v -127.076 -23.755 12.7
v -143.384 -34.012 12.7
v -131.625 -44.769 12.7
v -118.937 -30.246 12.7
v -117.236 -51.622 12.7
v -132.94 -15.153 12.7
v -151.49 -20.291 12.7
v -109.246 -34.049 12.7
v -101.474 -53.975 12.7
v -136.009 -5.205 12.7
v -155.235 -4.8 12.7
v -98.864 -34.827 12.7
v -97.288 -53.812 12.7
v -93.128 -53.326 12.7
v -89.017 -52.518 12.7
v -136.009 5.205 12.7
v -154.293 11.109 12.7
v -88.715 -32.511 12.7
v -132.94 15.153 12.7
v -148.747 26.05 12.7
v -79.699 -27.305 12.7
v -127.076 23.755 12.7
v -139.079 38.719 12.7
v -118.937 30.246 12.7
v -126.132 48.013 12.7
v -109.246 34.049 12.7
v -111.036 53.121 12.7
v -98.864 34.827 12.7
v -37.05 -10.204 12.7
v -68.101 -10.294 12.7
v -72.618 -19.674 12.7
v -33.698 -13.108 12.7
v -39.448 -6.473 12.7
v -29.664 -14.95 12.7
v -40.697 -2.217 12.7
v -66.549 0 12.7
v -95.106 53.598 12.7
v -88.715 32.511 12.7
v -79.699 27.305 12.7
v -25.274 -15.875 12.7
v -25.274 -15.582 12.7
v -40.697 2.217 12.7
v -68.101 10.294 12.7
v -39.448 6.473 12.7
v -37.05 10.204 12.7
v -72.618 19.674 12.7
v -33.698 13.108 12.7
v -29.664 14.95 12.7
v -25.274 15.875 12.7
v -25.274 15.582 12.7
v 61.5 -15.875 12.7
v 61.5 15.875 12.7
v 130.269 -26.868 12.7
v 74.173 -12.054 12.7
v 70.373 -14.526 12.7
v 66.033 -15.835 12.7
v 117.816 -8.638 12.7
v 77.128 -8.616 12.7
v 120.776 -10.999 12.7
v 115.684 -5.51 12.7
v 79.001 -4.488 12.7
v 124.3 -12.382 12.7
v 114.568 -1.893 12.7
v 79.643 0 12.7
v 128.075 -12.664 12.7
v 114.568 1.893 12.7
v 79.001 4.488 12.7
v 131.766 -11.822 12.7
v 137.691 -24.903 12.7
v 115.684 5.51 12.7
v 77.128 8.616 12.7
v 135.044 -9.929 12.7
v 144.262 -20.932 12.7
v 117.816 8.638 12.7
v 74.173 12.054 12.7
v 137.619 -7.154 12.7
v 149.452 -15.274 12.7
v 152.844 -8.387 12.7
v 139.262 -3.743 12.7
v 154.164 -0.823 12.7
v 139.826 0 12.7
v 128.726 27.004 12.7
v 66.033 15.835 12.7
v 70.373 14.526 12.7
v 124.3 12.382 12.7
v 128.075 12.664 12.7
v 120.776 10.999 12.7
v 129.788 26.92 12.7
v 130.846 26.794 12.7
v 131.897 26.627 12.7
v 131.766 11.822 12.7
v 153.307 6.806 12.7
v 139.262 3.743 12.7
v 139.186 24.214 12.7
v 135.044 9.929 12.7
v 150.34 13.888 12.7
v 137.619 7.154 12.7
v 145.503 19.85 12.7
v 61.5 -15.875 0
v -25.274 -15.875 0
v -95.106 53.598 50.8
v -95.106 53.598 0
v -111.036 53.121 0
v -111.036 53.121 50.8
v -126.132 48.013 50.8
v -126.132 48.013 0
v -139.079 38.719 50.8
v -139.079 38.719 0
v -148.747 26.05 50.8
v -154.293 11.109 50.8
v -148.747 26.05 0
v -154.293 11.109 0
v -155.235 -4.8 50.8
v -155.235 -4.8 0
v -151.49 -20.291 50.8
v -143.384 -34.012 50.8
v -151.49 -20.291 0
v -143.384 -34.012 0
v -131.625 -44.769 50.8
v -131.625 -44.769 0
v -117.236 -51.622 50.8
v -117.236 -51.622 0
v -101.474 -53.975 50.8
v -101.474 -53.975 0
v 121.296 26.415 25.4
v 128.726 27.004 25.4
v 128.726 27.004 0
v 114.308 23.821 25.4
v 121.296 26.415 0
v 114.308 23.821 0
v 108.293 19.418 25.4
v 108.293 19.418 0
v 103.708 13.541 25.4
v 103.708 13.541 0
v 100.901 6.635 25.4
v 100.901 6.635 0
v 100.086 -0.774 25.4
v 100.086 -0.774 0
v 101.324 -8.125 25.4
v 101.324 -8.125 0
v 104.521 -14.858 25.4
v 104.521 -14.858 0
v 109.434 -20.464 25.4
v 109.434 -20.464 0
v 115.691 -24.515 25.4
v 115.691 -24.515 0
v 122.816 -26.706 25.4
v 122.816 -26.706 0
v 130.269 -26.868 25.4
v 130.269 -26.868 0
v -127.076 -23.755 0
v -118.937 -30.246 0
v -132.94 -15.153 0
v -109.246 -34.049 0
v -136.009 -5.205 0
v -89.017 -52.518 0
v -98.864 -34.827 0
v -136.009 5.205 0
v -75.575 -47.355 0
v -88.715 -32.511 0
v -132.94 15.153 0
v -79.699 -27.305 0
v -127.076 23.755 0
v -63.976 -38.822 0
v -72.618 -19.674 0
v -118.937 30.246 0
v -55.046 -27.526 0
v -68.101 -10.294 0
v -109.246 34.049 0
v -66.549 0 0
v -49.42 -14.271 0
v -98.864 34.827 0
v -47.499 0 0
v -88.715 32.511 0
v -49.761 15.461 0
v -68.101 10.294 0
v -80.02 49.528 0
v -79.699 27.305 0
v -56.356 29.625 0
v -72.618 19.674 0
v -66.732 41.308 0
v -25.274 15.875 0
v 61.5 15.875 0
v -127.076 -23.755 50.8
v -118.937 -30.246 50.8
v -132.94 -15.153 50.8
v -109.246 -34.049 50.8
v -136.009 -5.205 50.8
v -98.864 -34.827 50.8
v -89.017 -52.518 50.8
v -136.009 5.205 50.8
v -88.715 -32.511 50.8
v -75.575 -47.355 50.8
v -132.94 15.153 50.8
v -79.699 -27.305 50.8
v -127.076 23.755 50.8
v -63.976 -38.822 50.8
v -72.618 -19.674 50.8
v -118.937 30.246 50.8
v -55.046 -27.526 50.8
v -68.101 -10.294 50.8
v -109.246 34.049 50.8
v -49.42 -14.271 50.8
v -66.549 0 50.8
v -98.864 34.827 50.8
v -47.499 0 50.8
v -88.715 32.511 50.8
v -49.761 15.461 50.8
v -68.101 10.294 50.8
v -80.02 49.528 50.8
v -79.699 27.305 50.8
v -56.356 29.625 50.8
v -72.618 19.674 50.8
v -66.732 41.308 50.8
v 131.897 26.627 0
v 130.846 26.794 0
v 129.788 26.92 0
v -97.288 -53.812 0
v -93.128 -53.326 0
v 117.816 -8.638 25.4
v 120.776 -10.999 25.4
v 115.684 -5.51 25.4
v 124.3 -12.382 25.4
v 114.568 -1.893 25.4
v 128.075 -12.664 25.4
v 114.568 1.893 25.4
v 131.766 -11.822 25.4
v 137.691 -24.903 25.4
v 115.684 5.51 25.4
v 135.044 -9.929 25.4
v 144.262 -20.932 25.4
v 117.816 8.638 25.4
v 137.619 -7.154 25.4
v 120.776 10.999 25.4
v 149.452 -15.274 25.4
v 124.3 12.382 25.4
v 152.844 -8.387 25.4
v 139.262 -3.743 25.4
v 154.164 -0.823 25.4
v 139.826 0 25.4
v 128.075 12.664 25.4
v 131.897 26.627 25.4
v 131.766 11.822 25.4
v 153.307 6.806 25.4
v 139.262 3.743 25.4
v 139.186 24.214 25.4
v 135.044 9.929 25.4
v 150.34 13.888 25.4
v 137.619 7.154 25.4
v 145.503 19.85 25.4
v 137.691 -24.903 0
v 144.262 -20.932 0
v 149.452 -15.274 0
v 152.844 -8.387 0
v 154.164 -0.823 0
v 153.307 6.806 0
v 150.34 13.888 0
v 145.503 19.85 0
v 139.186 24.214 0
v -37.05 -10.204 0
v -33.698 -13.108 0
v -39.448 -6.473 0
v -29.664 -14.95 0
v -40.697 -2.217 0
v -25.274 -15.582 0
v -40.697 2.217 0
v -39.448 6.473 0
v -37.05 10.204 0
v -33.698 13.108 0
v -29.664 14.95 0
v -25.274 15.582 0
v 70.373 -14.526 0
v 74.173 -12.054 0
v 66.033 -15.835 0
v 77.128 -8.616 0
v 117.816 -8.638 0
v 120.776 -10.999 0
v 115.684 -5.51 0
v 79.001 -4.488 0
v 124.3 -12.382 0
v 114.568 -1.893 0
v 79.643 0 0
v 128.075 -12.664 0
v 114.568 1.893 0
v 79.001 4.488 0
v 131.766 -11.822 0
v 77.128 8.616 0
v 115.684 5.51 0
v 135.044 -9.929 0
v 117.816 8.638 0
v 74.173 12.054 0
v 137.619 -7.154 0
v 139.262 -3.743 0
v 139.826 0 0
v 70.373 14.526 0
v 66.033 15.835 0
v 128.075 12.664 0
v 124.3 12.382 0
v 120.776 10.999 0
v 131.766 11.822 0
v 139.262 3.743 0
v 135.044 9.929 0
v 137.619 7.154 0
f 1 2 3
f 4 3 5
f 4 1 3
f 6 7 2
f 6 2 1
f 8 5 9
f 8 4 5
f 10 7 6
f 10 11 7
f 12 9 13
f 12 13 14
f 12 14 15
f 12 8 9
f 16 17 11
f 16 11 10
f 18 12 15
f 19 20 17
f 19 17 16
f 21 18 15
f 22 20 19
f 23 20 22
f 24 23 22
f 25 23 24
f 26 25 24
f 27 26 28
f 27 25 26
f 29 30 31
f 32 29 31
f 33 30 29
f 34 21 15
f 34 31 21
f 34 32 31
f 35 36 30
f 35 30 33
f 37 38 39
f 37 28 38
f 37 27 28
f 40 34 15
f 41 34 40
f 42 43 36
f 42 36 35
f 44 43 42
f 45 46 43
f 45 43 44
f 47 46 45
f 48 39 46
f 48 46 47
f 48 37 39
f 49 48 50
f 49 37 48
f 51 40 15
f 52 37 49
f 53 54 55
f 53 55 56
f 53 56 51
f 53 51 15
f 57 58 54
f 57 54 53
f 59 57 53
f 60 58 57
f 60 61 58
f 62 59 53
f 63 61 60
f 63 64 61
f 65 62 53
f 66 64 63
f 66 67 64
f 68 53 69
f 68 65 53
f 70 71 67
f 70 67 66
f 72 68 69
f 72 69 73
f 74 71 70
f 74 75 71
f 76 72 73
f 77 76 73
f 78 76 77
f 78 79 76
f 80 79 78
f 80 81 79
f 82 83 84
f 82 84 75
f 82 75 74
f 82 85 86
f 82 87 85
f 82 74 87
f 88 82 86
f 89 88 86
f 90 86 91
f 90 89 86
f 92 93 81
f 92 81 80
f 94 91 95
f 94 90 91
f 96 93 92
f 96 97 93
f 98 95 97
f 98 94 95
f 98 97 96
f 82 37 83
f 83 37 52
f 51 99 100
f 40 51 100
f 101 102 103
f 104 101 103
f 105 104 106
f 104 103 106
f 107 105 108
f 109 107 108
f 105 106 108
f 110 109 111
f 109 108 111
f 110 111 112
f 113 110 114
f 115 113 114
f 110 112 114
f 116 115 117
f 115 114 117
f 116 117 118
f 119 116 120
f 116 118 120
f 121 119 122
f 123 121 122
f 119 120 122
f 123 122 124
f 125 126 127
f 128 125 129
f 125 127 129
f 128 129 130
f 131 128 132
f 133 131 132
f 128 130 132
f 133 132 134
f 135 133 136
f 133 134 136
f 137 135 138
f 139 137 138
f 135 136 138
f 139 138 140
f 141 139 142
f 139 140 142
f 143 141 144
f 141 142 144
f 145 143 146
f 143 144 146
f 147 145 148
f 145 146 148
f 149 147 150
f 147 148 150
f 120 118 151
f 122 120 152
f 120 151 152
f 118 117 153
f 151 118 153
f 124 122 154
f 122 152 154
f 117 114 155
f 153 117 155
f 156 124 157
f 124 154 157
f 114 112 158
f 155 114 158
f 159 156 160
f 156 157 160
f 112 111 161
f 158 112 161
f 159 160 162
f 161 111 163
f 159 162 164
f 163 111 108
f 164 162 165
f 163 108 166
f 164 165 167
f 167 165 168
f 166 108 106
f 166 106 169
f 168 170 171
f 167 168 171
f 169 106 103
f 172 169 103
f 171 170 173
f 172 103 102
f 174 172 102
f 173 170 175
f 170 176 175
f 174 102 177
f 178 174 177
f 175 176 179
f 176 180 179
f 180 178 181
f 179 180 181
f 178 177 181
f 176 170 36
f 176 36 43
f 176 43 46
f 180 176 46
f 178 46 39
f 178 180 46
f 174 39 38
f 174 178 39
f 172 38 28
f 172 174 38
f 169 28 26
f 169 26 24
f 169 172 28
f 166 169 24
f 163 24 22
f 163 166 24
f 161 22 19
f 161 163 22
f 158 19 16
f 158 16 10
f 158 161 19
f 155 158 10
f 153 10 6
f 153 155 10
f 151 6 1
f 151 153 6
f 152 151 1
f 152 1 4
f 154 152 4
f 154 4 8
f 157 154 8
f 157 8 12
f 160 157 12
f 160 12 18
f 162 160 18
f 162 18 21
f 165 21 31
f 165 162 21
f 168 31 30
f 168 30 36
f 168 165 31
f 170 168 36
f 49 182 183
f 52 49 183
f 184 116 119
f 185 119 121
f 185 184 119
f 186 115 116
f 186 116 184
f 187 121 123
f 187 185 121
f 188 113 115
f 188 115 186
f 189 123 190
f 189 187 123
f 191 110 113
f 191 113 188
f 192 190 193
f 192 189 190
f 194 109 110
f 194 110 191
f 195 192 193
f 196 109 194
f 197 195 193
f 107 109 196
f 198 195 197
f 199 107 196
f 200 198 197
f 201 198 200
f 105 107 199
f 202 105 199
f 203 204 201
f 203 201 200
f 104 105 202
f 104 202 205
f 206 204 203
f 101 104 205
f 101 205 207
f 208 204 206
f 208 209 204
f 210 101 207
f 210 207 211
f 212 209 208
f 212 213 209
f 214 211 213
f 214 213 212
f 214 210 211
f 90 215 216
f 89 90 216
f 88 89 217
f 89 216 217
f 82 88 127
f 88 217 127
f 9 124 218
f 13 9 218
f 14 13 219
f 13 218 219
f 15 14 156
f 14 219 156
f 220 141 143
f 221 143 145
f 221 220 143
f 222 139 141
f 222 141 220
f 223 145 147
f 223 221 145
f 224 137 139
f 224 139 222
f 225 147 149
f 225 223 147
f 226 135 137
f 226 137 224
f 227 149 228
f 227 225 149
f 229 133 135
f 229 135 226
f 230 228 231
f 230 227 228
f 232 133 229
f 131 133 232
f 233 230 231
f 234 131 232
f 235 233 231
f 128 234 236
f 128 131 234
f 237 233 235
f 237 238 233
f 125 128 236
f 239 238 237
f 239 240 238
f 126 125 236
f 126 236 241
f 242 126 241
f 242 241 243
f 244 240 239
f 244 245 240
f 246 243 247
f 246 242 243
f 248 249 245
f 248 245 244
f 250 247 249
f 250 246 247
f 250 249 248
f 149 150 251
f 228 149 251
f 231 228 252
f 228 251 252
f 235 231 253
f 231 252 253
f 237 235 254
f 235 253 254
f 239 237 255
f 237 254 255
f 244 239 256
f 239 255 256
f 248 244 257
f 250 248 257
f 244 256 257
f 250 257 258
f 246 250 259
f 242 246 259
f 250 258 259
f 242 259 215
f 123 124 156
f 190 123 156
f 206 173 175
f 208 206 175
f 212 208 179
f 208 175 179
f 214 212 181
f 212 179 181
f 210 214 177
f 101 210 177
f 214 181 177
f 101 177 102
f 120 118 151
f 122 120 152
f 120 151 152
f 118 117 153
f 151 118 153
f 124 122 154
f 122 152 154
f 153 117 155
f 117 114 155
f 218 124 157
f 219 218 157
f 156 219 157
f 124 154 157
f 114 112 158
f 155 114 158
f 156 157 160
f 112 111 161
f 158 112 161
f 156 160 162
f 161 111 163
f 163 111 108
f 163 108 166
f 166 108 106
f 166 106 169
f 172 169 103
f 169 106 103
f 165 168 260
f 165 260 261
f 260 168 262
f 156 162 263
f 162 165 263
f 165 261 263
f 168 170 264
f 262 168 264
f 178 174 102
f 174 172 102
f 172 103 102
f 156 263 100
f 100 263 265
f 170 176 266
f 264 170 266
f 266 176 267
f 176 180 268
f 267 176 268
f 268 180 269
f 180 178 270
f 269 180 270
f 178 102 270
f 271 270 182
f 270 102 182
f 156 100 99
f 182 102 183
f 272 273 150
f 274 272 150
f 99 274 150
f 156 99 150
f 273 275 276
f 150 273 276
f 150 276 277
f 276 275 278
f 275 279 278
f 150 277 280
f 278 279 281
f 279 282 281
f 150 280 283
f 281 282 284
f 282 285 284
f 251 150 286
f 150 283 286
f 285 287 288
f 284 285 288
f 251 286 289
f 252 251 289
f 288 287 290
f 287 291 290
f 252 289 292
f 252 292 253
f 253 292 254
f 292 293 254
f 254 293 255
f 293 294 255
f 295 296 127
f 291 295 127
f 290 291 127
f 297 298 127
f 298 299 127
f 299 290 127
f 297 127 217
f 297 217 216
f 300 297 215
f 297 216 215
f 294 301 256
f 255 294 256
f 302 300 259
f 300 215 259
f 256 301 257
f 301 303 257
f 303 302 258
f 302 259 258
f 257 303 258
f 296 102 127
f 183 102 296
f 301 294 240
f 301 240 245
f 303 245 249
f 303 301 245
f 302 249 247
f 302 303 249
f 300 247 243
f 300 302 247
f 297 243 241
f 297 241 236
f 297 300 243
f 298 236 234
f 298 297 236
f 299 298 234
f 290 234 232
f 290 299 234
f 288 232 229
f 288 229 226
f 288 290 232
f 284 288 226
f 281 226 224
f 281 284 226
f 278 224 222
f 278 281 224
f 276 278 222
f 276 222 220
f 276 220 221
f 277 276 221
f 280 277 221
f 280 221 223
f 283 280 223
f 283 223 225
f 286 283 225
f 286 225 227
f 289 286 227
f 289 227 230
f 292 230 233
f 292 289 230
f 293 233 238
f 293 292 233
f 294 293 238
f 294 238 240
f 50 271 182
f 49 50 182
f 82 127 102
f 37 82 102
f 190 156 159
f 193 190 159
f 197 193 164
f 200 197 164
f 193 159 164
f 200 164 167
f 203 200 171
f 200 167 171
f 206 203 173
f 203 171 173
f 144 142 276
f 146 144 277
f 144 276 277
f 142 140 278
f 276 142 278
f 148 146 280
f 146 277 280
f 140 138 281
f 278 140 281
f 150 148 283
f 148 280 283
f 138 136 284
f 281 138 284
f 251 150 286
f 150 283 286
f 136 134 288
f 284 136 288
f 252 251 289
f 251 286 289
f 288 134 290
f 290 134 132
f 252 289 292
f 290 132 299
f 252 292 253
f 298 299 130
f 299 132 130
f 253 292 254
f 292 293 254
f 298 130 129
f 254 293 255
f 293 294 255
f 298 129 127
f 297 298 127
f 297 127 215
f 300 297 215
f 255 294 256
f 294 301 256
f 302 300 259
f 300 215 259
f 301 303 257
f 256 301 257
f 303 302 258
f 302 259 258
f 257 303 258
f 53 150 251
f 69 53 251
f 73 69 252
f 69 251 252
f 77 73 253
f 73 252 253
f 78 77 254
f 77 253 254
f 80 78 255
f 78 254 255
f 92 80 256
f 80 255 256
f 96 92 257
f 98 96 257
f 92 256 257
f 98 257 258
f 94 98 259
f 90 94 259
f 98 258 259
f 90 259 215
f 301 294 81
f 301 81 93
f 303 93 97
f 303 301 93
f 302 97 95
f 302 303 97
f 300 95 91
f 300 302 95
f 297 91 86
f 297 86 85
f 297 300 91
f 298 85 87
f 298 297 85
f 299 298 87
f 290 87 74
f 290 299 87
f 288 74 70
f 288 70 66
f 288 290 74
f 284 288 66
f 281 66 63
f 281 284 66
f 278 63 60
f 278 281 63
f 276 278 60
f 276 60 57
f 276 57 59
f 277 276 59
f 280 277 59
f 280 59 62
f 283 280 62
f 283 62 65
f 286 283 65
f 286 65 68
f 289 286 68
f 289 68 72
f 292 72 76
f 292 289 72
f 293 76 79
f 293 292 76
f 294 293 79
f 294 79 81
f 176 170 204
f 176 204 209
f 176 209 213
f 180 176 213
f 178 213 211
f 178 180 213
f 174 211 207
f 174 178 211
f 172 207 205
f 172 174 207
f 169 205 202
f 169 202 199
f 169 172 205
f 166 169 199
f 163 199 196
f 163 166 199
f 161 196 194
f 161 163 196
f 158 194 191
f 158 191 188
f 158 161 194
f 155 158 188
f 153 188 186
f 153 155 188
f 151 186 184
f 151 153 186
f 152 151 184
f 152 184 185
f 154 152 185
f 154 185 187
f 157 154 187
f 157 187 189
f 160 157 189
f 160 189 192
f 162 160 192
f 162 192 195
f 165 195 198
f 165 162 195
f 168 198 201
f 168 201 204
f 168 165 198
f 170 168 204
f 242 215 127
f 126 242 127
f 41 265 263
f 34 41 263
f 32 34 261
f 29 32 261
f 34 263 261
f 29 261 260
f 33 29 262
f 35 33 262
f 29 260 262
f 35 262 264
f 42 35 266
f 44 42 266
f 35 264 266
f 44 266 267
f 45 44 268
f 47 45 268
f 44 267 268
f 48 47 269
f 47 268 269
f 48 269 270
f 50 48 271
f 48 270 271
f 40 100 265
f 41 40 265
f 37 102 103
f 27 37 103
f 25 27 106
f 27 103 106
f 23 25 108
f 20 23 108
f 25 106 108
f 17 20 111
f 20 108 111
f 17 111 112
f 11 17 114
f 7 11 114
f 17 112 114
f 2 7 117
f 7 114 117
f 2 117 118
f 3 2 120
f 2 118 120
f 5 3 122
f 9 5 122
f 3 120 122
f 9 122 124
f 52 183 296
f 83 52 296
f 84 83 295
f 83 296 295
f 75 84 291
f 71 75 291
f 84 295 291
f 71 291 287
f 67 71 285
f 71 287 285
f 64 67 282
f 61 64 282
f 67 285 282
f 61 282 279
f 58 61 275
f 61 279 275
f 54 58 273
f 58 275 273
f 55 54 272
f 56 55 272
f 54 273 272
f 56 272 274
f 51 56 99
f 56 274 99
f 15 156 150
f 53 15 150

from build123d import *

# Parameters (mm, degrees)
F0_R     = 12.7
F1_DEPTH = 25.4
F0_R_2   = 34.925
F2_DEPTH = 50.8
F3_DEPTH = 12.7


with BuildPart() as f1:
    # F0 (on Top) → F1 (new body)
    with BuildSketch(Plane.XY):
        with BuildLine():
            Line((131.8974815489, 26.6268490786), (128.7264656024, 27.0036099847))
            ThreePointArc((128.7264656024, 27.0036099847), (100.0860287509, -0.7741034596), (130.2687059941, -26.8678188269))
            ThreePointArc((130.2687059941, -26.8678188269), (147.3345040916, -17.9825181836), (154.1769504378, 0))
            ThreePointArc((154.1769504378, 0), (147.8724114503, 17.3591749935), (131.8974815489, 26.6268490786))
        make_face()
        with Locations((127.1259504378, 0)):
            Circle(F0_R, mode=Mode.SUBTRACT)
    extrude(amount=F1_DEPTH)


with BuildPart() as f2:
    # F0 (on Top) → F2 (new body)
    with BuildSketch(Plane.XY):
        with BuildLine():
            ThreePointArc((-89.0174641021, -52.5179407791), (-59.1323158636, -33.4735449631), (-47.4990495622, 0))
            ThreePointArc((-47.4990495622, 0), (-61.119224987, 35.8439500962), (-95.1058585849, 53.5980108649))
            ThreePointArc((-95.1058585849, 53.5980108649), (-155.3547198505, 3.1896699332), (-101.4740495622, -53.975))
            Line((-101.4740495622, -53.975), (-89.0174641021, -52.5179407791))
        make_face()
        with Locations((-101.4740495622, 0)):
            Circle(F0_R_2, mode=Mode.SUBTRACT)
    extrude(amount=F2_DEPTH)


with BuildPart() as f3:
    # F0 (on Top) → F3 (new body)
    with BuildSketch(Plane.XY):
        with BuildLine():
            ThreePointArc((-89.0174641021, -52.5179407791), (-59.1323158636, -33.4735449631), (-47.4990495622, 0))
            ThreePointArc((-47.4990495622, 0), (-61.119224987, 35.8439500962), (-95.1058585849, 53.5980108649))
            ThreePointArc((-95.1058585849, 53.5980108649), (-155.3547198505, 3.1896699332), (-101.4740495622, -53.975))
            Line((-101.4740495622, -53.975), (-89.0174641021, -52.5179407791))
        make_face()
        with Locations((-101.4740495622, 0)):
            Circle(F0_R_2, mode=Mode.SUBTRACT)
        with BuildLine():
            ThreePointArc((-95.1058585849, 53.5980108649), (-61.119224987, 35.8439500962), (-47.4990495622, 0))
            ThreePointArc((-47.4990495622, 0), (-59.1323158636, -33.4735449631), (-89.0174641021, -52.5179407791))
            Line((-89.0174641021, -52.5179407791), (130.2687059941, -26.8678188269))
            ThreePointArc((130.2687059941, -26.8678188269), (100.0860287509, -0.7741034596), (128.7264656024, 27.0036099847))
            Line((128.7264656024, 27.0036099847), (-95.1058585849, 53.5980108649))
        make_face()
        with BuildLine():
            ThreePointArc((61.5001760411, 15.875), (79.6426461577, 0), (61.5001760411, -15.875))
            Line((61.5001760411, -15.875), (-25.2740495622, -15.875))
            Line((-25.2740495622, -15.875), (-25.2740495622, -15.5815852659))
            ThreePointArc((-25.2740495622, -15.5815852659), (-40.8556348281, 0), (-25.2740495622, 15.5815852659))
            Line((-25.2740495622, 15.5815852659), (-25.2740495622, 15.875))
            Line((-25.2740495622, 15.875), (61.5001760411, 15.875))
        make_face(mode=Mode.SUBTRACT)
        with BuildLine():
            ThreePointArc((-101.4740495622, -53.975), (-95.2032931705, -53.6094976592), (-89.0174641021, -52.5179407791))
            Line((-89.0174641021, -52.5179407791), (-101.4740495622, -53.975))
        make_face()
        with BuildLine():
            Line((131.8974815489, 26.6268490786), (128.7264656024, 27.0036099847))
            ThreePointArc((128.7264656024, 27.0036099847), (100.0860287509, -0.7741034596), (130.2687059941, -26.8678188269))
            ThreePointArc((130.2687059941, -26.8678188269), (147.3345040916, -17.9825181836), (154.1769504378, 0))
            ThreePointArc((154.1769504378, 0), (147.8724114503, 17.3591749935), (131.8974815489, 26.6268490786))
        make_face()
        with Locations((127.1259504378, 0)):
            Circle(F0_R, mode=Mode.SUBTRACT)
        with BuildLine():
            ThreePointArc((131.8974815489, 26.6268490786), (130.3175379158, 26.8620619158), (128.7264656024, 27.0036099847))
            Line((128.7264656024, 27.0036099847), (131.8974815489, 26.6268490786))
        make_face()
    extrude(amount=F3_DEPTH)


solid = Compound([f1.part, f2.part, f3.part])
